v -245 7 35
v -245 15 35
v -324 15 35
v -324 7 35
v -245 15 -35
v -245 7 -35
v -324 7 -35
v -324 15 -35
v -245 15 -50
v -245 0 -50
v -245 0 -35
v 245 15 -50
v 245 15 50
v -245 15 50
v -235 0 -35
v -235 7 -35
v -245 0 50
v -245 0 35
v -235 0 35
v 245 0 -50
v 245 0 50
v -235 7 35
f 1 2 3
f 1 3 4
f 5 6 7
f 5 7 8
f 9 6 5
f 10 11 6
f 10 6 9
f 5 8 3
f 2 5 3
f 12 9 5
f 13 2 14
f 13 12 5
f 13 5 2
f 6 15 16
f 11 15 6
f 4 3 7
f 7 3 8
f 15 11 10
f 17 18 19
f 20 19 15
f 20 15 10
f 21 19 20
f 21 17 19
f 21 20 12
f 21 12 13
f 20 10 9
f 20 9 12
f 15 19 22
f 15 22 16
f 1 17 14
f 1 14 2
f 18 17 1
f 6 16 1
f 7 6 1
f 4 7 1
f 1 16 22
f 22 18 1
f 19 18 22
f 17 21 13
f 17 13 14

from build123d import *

# Parameters (mm, degrees)
EXTRUDE_1_DEPTH = 15
EXTRUDE_3_DEPTH = 89


with BuildPart() as part:
    # 草图1 → 凸台-拉伸1 (new body)
    with BuildSketch(Plane.XZ):
        Polygon((245, -50), (245, 50), (-245, 50), (-245, 35), (-235, 35), (-235, -35), (-245, -35), (-245, -50), align=None)
    extrude(amount=-EXTRUDE_1_DEPTH)

    # 草图2 → 凸台-拉伸3 (add)
    with BuildSketch(Plane.ZY.offset(235)):
        Polygon((-26.300861676, 7), (-35, 7), (-35, 15), (35, 15), (35, 7), align=None)
    extrude(amount=EXTRUDE_3_DEPTH)


solid = part.part
